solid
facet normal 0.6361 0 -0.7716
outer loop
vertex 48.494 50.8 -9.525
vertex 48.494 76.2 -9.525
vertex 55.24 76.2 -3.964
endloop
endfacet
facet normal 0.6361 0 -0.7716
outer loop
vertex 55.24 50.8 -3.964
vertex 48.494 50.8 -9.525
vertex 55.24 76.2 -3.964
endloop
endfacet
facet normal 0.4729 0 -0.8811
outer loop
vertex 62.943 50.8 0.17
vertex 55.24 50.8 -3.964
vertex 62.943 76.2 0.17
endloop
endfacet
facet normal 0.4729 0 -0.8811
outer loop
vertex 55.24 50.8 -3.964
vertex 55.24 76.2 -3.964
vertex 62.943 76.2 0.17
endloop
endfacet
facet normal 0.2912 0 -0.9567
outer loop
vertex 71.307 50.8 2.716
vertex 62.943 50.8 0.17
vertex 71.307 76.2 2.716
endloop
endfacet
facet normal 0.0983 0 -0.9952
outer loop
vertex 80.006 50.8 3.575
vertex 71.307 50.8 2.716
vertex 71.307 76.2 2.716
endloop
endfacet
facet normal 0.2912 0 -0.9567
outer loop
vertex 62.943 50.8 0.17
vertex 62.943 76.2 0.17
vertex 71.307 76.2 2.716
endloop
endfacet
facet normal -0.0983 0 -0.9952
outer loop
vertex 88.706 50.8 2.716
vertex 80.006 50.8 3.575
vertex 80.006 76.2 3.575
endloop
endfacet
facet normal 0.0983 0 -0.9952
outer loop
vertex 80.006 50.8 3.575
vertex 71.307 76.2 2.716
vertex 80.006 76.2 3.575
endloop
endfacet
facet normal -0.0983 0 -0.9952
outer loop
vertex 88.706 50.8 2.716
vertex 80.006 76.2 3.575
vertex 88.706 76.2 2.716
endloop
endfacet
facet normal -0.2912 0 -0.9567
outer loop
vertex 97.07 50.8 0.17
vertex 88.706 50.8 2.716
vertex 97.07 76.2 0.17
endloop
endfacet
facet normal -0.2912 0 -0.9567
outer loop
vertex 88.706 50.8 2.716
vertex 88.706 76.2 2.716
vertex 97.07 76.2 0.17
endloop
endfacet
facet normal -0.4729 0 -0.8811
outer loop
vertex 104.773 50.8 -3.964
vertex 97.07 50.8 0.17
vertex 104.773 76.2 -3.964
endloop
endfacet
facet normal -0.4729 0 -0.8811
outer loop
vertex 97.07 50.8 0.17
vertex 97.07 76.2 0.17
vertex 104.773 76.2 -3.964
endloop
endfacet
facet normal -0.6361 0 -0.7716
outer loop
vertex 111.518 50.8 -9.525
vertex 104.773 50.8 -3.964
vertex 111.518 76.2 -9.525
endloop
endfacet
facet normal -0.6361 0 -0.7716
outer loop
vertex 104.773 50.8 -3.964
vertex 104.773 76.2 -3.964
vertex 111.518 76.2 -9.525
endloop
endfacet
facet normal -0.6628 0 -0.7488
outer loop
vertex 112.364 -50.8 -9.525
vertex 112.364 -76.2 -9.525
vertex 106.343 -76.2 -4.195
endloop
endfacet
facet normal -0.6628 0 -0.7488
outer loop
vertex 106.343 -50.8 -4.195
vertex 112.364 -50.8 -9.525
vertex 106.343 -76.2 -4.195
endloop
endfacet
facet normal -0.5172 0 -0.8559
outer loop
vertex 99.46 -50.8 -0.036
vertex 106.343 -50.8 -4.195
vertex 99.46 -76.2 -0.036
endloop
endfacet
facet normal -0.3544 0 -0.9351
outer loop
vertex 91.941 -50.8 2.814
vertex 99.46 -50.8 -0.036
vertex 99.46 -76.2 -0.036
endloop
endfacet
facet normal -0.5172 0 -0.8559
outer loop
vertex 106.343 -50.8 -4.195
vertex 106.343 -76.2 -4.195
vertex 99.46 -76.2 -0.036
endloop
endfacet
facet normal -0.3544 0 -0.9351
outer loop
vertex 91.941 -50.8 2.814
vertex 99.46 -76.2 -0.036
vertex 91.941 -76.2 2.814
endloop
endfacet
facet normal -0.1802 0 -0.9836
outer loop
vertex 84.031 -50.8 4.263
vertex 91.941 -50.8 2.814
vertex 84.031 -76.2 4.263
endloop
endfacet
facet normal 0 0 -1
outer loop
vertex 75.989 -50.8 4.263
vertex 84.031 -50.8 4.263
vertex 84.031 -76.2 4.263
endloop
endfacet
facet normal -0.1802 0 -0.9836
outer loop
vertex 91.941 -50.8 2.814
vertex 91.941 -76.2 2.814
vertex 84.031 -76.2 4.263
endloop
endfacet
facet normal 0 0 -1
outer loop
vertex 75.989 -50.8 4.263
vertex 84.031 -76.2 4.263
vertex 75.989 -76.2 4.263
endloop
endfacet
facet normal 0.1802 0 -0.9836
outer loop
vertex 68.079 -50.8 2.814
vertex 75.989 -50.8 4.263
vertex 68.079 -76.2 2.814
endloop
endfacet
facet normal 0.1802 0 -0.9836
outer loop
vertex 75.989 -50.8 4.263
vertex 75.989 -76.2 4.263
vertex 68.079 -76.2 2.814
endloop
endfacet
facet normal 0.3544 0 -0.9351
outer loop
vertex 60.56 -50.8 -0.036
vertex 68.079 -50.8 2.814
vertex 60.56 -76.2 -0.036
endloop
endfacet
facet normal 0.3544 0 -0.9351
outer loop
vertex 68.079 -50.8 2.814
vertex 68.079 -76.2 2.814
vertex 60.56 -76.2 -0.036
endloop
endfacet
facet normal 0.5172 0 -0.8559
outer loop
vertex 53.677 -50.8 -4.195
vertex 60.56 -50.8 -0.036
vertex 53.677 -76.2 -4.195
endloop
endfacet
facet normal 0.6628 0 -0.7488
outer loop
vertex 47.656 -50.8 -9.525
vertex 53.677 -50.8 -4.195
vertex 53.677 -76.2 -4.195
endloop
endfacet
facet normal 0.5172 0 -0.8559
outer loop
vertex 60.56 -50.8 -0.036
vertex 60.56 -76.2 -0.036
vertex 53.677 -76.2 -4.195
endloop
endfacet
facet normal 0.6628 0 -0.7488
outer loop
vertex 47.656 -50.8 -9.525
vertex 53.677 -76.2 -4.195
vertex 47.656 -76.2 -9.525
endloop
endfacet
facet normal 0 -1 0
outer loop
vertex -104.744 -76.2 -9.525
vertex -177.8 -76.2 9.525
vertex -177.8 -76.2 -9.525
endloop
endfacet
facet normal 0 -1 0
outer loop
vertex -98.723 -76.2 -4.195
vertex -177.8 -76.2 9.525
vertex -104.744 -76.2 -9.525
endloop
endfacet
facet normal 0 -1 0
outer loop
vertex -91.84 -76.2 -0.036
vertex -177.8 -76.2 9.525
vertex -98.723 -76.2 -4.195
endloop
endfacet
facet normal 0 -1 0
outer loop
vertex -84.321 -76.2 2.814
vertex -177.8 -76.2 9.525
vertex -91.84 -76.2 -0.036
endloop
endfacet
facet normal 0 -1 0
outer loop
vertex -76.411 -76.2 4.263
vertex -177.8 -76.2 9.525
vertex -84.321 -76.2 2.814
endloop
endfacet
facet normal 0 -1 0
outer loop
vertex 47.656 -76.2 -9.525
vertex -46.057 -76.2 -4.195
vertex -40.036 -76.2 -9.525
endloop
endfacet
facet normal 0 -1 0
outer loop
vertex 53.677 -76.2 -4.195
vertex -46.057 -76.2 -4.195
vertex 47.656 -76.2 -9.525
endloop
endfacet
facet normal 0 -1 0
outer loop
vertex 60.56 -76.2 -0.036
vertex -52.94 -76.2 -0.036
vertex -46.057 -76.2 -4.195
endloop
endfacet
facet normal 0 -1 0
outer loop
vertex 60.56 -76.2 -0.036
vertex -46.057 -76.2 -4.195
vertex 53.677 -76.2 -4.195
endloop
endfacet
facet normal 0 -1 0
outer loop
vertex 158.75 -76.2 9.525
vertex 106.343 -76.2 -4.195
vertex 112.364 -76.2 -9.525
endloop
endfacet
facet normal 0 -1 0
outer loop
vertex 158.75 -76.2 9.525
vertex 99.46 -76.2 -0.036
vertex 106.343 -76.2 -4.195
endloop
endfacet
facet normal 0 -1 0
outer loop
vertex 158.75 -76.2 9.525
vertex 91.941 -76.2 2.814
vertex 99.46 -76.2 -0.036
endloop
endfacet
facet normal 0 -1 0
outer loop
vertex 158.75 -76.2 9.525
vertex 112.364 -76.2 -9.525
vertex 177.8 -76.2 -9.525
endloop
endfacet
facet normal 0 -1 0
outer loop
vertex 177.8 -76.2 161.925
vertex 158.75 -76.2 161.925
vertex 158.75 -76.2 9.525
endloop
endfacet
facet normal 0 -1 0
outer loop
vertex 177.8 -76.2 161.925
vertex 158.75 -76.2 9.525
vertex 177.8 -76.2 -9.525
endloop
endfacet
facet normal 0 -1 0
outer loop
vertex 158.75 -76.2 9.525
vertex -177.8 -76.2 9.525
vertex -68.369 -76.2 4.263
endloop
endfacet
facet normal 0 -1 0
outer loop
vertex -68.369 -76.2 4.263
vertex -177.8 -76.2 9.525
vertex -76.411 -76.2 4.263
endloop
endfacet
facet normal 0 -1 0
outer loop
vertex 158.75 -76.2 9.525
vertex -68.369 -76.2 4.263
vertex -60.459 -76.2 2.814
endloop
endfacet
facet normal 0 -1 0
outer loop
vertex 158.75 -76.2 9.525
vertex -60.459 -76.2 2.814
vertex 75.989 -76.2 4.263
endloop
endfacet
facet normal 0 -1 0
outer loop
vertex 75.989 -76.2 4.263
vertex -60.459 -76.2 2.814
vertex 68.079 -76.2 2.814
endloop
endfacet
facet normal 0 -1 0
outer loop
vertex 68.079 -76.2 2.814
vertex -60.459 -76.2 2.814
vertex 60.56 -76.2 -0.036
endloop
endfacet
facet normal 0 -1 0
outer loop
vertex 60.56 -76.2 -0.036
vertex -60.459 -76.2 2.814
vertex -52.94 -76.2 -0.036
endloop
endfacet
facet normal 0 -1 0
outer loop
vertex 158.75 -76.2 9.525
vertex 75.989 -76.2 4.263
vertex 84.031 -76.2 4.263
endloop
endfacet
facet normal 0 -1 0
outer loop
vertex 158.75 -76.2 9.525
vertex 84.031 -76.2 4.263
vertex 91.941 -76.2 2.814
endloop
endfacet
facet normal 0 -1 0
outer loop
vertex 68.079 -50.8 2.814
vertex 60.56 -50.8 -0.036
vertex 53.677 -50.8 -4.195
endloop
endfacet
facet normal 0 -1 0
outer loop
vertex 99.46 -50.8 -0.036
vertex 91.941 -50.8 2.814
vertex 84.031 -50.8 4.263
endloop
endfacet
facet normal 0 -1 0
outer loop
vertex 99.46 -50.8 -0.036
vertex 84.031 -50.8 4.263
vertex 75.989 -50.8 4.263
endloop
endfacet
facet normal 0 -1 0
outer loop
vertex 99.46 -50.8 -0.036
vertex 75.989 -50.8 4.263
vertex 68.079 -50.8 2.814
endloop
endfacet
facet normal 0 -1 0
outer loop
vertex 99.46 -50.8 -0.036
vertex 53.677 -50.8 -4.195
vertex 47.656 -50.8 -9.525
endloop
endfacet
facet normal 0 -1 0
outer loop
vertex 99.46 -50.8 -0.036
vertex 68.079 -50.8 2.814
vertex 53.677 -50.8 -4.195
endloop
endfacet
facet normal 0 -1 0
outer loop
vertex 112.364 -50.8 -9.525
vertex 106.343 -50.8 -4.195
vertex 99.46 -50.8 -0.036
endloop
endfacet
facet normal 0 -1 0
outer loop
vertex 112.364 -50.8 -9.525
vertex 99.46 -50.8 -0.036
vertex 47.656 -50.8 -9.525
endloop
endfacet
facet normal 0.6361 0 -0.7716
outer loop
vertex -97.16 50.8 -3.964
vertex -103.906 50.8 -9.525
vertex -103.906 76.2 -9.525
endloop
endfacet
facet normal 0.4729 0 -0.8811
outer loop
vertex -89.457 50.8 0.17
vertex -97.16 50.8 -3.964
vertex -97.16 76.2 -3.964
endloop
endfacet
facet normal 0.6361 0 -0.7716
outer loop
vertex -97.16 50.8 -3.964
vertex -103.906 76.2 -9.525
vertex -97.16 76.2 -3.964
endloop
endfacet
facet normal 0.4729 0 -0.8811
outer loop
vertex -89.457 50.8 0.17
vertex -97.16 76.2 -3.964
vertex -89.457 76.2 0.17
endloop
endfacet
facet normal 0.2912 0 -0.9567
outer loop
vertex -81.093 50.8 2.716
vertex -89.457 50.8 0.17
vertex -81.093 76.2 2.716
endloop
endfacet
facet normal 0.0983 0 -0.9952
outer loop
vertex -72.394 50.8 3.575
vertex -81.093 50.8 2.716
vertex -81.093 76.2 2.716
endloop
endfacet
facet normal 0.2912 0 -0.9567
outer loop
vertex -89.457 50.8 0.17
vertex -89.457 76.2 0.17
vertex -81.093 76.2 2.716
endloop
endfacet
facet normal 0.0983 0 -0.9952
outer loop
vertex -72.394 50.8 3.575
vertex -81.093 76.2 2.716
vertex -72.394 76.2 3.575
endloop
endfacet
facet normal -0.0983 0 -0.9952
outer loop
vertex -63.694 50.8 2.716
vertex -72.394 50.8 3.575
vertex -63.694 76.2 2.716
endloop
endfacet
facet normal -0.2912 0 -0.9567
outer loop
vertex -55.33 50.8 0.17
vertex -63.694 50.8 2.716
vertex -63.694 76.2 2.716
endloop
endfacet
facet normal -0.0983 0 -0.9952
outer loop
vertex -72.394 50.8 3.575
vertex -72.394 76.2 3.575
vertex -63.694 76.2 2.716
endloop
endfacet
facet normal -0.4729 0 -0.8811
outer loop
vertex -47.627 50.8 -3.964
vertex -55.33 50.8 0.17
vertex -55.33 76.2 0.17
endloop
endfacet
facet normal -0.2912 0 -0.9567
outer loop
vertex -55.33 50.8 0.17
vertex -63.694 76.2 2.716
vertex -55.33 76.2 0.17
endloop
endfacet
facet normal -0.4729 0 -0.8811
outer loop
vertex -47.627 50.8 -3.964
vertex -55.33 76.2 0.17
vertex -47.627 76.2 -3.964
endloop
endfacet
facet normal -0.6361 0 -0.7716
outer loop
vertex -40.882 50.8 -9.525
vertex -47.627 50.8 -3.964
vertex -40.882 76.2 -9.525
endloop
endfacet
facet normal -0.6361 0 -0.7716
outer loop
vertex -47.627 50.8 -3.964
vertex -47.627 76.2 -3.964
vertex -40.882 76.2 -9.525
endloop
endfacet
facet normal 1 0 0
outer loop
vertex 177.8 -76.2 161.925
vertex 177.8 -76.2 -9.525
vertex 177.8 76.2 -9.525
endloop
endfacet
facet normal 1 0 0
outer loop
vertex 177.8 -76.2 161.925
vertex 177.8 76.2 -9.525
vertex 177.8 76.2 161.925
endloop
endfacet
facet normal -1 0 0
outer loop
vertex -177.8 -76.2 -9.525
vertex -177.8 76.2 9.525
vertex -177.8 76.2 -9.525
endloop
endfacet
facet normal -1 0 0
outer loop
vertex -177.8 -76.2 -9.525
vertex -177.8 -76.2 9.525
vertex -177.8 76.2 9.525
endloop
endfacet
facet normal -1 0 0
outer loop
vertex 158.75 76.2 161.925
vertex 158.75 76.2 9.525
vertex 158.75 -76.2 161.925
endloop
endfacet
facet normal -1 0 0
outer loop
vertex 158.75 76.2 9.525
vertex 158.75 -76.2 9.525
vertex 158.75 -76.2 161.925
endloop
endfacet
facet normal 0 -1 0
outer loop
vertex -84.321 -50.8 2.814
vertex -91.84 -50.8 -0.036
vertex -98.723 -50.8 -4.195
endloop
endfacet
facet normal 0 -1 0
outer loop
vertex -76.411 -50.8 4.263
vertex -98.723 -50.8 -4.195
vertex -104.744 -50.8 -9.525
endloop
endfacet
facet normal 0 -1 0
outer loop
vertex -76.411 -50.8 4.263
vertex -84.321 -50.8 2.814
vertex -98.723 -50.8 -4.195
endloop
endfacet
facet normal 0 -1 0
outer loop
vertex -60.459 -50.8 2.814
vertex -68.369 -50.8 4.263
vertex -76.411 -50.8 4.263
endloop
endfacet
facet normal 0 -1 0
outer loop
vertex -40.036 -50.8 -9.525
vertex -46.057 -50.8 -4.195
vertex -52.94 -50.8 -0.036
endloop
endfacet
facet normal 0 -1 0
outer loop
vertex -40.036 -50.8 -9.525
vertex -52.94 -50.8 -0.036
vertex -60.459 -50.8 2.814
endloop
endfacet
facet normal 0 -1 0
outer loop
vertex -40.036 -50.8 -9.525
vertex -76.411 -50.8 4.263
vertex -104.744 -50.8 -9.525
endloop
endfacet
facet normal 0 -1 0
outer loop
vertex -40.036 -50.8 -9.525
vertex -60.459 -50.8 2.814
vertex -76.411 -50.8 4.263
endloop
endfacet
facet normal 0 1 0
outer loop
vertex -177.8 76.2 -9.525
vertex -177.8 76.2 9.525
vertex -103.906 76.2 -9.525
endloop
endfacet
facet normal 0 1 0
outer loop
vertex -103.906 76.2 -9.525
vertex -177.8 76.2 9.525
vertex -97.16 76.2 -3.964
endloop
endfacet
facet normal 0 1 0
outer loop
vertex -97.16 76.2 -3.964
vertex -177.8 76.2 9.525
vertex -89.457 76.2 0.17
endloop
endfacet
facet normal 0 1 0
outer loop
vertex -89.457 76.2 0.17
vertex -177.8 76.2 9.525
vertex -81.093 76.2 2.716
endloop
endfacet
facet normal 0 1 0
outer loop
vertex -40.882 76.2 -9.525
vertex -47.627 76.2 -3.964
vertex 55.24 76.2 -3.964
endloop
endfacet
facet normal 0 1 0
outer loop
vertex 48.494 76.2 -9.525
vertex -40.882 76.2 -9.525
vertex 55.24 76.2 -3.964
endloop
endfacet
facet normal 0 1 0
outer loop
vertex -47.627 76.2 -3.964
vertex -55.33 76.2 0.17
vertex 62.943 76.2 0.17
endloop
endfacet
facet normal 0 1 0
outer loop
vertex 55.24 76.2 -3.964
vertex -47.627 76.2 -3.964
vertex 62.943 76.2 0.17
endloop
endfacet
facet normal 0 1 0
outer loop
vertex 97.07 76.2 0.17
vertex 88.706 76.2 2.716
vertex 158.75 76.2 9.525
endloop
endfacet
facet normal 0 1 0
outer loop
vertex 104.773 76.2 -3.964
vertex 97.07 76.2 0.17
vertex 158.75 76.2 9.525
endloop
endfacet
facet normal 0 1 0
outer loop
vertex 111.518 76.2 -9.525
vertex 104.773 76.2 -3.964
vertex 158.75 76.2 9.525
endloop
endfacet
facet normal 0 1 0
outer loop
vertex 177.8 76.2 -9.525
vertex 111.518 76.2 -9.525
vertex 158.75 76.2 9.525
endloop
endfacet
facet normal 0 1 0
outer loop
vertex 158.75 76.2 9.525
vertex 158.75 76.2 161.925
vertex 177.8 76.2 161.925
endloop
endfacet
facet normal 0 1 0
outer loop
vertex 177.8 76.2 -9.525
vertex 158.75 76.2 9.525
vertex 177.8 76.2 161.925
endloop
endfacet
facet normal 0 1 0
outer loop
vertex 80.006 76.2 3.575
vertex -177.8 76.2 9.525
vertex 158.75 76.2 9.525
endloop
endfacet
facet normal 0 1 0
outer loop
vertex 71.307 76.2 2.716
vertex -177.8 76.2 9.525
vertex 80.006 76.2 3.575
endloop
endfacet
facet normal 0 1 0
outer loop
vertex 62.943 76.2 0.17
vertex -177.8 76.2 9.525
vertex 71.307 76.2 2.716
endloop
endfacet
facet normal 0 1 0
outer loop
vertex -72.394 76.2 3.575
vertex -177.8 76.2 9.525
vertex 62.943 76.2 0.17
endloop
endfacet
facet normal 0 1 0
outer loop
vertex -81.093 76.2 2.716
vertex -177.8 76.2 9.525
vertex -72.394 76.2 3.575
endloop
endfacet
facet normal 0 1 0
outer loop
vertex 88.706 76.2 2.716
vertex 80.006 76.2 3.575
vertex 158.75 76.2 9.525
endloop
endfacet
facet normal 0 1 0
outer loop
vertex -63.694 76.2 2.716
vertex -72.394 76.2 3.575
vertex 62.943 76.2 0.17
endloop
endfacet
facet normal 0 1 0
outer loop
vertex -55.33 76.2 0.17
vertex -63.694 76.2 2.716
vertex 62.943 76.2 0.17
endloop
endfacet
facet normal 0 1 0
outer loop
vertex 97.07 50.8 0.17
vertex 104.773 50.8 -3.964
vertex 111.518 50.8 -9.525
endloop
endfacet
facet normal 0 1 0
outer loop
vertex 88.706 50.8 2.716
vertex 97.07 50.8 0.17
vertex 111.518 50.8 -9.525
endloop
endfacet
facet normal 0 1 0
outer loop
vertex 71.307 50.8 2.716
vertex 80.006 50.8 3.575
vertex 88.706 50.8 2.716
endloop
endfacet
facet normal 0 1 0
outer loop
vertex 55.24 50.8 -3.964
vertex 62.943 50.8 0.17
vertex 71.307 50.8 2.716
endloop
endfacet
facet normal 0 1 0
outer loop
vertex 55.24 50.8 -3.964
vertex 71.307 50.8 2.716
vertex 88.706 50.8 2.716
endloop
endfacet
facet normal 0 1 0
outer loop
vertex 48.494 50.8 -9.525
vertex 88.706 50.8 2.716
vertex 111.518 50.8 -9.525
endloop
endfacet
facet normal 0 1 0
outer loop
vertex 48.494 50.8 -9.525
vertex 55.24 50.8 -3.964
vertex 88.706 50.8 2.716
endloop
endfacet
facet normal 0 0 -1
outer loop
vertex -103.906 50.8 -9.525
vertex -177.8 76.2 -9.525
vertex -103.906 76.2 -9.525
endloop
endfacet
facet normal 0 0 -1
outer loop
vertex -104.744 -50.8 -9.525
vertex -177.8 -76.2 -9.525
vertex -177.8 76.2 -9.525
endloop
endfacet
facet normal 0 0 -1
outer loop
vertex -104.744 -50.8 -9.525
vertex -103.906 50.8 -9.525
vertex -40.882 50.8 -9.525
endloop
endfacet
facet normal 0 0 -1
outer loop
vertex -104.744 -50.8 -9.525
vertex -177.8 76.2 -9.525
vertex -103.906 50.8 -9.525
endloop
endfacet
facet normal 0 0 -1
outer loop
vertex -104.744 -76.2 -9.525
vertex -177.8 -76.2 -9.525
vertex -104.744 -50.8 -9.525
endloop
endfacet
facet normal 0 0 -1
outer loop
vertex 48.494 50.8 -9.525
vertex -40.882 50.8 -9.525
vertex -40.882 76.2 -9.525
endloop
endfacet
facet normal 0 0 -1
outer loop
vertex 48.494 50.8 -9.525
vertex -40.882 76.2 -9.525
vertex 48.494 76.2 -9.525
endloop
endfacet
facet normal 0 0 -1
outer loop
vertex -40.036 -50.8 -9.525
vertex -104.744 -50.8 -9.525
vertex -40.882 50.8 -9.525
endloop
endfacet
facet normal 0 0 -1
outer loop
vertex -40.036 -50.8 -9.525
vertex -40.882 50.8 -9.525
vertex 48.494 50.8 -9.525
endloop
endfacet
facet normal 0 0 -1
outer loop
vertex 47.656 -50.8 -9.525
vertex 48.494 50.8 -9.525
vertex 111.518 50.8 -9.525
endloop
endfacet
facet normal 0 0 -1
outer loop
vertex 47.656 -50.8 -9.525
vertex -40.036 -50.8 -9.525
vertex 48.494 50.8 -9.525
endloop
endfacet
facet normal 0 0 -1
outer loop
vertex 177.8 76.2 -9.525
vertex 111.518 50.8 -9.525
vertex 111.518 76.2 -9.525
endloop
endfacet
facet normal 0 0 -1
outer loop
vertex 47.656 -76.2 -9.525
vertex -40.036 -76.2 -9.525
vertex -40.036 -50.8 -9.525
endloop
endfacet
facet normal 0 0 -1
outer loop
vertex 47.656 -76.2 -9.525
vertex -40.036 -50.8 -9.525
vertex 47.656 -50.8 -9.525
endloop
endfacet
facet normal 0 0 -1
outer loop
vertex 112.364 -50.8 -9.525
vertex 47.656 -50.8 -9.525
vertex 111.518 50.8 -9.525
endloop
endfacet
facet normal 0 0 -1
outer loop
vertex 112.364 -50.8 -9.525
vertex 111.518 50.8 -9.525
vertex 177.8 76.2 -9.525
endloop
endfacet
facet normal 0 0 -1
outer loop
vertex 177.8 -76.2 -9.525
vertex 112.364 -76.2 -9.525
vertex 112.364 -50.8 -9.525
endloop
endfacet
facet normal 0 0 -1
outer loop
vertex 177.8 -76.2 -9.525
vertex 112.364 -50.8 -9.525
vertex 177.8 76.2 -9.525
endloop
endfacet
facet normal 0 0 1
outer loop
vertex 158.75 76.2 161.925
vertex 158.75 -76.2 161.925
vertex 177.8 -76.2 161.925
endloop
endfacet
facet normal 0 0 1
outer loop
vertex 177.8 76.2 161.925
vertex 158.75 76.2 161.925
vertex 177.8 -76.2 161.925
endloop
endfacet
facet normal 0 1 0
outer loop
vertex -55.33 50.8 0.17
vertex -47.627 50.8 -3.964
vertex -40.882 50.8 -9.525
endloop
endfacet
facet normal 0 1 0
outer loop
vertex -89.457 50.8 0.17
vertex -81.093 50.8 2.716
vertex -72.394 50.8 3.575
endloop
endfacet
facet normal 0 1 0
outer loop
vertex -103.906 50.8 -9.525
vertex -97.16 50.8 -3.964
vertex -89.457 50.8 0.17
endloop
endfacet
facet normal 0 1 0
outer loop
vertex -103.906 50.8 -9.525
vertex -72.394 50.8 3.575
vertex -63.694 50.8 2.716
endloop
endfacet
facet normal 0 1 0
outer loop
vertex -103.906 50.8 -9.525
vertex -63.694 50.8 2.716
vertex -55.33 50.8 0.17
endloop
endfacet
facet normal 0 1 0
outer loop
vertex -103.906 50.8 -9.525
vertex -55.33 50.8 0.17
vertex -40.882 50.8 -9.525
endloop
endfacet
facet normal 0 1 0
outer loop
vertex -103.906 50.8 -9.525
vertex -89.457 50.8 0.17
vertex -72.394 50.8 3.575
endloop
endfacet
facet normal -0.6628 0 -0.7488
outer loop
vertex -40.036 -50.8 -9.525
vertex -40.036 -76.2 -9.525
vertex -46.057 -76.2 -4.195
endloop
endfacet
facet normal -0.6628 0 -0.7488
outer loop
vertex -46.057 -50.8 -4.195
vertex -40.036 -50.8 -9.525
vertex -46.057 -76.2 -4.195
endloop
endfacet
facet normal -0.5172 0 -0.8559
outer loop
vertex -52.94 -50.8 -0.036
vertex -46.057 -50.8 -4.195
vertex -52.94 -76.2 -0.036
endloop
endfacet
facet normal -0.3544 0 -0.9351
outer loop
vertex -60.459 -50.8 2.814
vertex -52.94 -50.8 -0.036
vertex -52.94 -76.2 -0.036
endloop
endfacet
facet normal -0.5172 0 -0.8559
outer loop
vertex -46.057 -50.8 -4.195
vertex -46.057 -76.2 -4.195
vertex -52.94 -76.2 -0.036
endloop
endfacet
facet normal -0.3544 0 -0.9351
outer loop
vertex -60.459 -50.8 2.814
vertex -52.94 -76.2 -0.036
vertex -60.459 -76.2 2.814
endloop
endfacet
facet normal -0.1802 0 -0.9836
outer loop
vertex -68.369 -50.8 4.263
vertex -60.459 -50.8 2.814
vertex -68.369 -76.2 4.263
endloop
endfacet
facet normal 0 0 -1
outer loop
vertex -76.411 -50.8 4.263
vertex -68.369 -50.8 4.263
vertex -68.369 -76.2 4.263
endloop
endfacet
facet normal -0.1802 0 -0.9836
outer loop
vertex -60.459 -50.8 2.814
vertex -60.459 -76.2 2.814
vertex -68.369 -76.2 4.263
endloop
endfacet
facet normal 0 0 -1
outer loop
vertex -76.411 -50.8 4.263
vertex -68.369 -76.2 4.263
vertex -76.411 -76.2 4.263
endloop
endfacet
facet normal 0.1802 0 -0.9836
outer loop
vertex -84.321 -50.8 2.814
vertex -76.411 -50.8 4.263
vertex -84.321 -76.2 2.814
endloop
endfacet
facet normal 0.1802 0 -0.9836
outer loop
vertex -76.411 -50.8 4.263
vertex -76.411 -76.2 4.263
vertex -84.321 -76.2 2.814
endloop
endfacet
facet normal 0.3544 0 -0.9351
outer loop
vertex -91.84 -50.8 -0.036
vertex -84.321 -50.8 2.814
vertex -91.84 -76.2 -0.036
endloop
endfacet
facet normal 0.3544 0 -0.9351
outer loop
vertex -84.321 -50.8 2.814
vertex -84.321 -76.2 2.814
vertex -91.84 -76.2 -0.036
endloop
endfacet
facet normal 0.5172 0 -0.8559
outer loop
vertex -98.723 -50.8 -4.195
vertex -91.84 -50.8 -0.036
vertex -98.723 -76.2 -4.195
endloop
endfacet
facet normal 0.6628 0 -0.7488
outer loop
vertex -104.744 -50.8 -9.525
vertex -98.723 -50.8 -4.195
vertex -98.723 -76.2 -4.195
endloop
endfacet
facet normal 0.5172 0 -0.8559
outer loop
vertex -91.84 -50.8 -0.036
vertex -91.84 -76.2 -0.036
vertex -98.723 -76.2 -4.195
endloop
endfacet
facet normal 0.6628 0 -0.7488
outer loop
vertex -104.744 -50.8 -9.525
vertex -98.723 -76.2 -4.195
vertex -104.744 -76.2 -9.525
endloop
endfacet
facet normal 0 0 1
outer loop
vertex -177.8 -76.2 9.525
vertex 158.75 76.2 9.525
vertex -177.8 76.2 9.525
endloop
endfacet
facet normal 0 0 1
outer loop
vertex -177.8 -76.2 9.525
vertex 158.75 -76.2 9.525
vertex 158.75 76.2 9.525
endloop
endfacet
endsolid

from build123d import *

# Parameters (mm, degrees)
F0_W     = 19.05
F0_H     = 152.4
F1_DEPTH = 76.2
F3_DEPTH = 25.4
F5_DEPTH = 25.4


with BuildPart() as f1:
    # F0 (on Front) → F1 (new body, symmetric)
    with BuildSketch(Plane.XZ):
        Polygon((-177.8, -9.525), (177.8, -9.525), (177.8, 9.525), (158.75, 9.525), (-177.8, 9.525), align=None)
        with Locations((168.275, 85.725)):
            Rectangle(F0_W, F0_H)
    extrude(amount=F1_DEPTH, both=True)

    # F2 (on face) → F3 (cut)
    with BuildSketch(Plane.XZ.offset(76.2)):
        with BuildLine():
            ThreePointArc((-40.0361424247, -9.525), (-72.39, 4.445), (-104.7438575753, -9.525))
            Line((-104.7438575753, -9.525), (-72.39, -9.525))
            Line((-72.39, -9.525), (-40.0361424247, -9.525))
        make_face()
        with BuildLine():
            ThreePointArc((112.3638575753, -9.525), (80.01, 4.445), (47.6561424247, -9.525))
            Line((47.6561424247, -9.525), (80.01, -9.525))
            Line((80.01, -9.525), (112.3638575753, -9.525))
        make_face()
    extrude(amount=-F3_DEPTH, mode=Mode.SUBTRACT)

    # F4 (on face) → F5 (cut)
    with BuildSketch(Plane(origin=(0, 76.2, 0), x_dir=(-1, 0, 0), z_dir=(0, 1, 0))):
        with BuildLine():
            ThreePointArc((-48.4944535083, -9.525), (-80.0064127753, 3.5753760285), (-111.5183720423, -9.525))
            Line((-111.5183720423, -9.525), (-48.4944535083, -9.525))
        make_face()
        with BuildLine():
            ThreePointArc((103.9055464917, -9.525), (72.3935872247, 3.5753760285), (40.8816279577, -9.525))
            Line((40.8816279577, -9.525), (103.9055464917, -9.525))
        make_face()
    extrude(amount=-F5_DEPTH, mode=Mode.SUBTRACT)


solid = f1.part
